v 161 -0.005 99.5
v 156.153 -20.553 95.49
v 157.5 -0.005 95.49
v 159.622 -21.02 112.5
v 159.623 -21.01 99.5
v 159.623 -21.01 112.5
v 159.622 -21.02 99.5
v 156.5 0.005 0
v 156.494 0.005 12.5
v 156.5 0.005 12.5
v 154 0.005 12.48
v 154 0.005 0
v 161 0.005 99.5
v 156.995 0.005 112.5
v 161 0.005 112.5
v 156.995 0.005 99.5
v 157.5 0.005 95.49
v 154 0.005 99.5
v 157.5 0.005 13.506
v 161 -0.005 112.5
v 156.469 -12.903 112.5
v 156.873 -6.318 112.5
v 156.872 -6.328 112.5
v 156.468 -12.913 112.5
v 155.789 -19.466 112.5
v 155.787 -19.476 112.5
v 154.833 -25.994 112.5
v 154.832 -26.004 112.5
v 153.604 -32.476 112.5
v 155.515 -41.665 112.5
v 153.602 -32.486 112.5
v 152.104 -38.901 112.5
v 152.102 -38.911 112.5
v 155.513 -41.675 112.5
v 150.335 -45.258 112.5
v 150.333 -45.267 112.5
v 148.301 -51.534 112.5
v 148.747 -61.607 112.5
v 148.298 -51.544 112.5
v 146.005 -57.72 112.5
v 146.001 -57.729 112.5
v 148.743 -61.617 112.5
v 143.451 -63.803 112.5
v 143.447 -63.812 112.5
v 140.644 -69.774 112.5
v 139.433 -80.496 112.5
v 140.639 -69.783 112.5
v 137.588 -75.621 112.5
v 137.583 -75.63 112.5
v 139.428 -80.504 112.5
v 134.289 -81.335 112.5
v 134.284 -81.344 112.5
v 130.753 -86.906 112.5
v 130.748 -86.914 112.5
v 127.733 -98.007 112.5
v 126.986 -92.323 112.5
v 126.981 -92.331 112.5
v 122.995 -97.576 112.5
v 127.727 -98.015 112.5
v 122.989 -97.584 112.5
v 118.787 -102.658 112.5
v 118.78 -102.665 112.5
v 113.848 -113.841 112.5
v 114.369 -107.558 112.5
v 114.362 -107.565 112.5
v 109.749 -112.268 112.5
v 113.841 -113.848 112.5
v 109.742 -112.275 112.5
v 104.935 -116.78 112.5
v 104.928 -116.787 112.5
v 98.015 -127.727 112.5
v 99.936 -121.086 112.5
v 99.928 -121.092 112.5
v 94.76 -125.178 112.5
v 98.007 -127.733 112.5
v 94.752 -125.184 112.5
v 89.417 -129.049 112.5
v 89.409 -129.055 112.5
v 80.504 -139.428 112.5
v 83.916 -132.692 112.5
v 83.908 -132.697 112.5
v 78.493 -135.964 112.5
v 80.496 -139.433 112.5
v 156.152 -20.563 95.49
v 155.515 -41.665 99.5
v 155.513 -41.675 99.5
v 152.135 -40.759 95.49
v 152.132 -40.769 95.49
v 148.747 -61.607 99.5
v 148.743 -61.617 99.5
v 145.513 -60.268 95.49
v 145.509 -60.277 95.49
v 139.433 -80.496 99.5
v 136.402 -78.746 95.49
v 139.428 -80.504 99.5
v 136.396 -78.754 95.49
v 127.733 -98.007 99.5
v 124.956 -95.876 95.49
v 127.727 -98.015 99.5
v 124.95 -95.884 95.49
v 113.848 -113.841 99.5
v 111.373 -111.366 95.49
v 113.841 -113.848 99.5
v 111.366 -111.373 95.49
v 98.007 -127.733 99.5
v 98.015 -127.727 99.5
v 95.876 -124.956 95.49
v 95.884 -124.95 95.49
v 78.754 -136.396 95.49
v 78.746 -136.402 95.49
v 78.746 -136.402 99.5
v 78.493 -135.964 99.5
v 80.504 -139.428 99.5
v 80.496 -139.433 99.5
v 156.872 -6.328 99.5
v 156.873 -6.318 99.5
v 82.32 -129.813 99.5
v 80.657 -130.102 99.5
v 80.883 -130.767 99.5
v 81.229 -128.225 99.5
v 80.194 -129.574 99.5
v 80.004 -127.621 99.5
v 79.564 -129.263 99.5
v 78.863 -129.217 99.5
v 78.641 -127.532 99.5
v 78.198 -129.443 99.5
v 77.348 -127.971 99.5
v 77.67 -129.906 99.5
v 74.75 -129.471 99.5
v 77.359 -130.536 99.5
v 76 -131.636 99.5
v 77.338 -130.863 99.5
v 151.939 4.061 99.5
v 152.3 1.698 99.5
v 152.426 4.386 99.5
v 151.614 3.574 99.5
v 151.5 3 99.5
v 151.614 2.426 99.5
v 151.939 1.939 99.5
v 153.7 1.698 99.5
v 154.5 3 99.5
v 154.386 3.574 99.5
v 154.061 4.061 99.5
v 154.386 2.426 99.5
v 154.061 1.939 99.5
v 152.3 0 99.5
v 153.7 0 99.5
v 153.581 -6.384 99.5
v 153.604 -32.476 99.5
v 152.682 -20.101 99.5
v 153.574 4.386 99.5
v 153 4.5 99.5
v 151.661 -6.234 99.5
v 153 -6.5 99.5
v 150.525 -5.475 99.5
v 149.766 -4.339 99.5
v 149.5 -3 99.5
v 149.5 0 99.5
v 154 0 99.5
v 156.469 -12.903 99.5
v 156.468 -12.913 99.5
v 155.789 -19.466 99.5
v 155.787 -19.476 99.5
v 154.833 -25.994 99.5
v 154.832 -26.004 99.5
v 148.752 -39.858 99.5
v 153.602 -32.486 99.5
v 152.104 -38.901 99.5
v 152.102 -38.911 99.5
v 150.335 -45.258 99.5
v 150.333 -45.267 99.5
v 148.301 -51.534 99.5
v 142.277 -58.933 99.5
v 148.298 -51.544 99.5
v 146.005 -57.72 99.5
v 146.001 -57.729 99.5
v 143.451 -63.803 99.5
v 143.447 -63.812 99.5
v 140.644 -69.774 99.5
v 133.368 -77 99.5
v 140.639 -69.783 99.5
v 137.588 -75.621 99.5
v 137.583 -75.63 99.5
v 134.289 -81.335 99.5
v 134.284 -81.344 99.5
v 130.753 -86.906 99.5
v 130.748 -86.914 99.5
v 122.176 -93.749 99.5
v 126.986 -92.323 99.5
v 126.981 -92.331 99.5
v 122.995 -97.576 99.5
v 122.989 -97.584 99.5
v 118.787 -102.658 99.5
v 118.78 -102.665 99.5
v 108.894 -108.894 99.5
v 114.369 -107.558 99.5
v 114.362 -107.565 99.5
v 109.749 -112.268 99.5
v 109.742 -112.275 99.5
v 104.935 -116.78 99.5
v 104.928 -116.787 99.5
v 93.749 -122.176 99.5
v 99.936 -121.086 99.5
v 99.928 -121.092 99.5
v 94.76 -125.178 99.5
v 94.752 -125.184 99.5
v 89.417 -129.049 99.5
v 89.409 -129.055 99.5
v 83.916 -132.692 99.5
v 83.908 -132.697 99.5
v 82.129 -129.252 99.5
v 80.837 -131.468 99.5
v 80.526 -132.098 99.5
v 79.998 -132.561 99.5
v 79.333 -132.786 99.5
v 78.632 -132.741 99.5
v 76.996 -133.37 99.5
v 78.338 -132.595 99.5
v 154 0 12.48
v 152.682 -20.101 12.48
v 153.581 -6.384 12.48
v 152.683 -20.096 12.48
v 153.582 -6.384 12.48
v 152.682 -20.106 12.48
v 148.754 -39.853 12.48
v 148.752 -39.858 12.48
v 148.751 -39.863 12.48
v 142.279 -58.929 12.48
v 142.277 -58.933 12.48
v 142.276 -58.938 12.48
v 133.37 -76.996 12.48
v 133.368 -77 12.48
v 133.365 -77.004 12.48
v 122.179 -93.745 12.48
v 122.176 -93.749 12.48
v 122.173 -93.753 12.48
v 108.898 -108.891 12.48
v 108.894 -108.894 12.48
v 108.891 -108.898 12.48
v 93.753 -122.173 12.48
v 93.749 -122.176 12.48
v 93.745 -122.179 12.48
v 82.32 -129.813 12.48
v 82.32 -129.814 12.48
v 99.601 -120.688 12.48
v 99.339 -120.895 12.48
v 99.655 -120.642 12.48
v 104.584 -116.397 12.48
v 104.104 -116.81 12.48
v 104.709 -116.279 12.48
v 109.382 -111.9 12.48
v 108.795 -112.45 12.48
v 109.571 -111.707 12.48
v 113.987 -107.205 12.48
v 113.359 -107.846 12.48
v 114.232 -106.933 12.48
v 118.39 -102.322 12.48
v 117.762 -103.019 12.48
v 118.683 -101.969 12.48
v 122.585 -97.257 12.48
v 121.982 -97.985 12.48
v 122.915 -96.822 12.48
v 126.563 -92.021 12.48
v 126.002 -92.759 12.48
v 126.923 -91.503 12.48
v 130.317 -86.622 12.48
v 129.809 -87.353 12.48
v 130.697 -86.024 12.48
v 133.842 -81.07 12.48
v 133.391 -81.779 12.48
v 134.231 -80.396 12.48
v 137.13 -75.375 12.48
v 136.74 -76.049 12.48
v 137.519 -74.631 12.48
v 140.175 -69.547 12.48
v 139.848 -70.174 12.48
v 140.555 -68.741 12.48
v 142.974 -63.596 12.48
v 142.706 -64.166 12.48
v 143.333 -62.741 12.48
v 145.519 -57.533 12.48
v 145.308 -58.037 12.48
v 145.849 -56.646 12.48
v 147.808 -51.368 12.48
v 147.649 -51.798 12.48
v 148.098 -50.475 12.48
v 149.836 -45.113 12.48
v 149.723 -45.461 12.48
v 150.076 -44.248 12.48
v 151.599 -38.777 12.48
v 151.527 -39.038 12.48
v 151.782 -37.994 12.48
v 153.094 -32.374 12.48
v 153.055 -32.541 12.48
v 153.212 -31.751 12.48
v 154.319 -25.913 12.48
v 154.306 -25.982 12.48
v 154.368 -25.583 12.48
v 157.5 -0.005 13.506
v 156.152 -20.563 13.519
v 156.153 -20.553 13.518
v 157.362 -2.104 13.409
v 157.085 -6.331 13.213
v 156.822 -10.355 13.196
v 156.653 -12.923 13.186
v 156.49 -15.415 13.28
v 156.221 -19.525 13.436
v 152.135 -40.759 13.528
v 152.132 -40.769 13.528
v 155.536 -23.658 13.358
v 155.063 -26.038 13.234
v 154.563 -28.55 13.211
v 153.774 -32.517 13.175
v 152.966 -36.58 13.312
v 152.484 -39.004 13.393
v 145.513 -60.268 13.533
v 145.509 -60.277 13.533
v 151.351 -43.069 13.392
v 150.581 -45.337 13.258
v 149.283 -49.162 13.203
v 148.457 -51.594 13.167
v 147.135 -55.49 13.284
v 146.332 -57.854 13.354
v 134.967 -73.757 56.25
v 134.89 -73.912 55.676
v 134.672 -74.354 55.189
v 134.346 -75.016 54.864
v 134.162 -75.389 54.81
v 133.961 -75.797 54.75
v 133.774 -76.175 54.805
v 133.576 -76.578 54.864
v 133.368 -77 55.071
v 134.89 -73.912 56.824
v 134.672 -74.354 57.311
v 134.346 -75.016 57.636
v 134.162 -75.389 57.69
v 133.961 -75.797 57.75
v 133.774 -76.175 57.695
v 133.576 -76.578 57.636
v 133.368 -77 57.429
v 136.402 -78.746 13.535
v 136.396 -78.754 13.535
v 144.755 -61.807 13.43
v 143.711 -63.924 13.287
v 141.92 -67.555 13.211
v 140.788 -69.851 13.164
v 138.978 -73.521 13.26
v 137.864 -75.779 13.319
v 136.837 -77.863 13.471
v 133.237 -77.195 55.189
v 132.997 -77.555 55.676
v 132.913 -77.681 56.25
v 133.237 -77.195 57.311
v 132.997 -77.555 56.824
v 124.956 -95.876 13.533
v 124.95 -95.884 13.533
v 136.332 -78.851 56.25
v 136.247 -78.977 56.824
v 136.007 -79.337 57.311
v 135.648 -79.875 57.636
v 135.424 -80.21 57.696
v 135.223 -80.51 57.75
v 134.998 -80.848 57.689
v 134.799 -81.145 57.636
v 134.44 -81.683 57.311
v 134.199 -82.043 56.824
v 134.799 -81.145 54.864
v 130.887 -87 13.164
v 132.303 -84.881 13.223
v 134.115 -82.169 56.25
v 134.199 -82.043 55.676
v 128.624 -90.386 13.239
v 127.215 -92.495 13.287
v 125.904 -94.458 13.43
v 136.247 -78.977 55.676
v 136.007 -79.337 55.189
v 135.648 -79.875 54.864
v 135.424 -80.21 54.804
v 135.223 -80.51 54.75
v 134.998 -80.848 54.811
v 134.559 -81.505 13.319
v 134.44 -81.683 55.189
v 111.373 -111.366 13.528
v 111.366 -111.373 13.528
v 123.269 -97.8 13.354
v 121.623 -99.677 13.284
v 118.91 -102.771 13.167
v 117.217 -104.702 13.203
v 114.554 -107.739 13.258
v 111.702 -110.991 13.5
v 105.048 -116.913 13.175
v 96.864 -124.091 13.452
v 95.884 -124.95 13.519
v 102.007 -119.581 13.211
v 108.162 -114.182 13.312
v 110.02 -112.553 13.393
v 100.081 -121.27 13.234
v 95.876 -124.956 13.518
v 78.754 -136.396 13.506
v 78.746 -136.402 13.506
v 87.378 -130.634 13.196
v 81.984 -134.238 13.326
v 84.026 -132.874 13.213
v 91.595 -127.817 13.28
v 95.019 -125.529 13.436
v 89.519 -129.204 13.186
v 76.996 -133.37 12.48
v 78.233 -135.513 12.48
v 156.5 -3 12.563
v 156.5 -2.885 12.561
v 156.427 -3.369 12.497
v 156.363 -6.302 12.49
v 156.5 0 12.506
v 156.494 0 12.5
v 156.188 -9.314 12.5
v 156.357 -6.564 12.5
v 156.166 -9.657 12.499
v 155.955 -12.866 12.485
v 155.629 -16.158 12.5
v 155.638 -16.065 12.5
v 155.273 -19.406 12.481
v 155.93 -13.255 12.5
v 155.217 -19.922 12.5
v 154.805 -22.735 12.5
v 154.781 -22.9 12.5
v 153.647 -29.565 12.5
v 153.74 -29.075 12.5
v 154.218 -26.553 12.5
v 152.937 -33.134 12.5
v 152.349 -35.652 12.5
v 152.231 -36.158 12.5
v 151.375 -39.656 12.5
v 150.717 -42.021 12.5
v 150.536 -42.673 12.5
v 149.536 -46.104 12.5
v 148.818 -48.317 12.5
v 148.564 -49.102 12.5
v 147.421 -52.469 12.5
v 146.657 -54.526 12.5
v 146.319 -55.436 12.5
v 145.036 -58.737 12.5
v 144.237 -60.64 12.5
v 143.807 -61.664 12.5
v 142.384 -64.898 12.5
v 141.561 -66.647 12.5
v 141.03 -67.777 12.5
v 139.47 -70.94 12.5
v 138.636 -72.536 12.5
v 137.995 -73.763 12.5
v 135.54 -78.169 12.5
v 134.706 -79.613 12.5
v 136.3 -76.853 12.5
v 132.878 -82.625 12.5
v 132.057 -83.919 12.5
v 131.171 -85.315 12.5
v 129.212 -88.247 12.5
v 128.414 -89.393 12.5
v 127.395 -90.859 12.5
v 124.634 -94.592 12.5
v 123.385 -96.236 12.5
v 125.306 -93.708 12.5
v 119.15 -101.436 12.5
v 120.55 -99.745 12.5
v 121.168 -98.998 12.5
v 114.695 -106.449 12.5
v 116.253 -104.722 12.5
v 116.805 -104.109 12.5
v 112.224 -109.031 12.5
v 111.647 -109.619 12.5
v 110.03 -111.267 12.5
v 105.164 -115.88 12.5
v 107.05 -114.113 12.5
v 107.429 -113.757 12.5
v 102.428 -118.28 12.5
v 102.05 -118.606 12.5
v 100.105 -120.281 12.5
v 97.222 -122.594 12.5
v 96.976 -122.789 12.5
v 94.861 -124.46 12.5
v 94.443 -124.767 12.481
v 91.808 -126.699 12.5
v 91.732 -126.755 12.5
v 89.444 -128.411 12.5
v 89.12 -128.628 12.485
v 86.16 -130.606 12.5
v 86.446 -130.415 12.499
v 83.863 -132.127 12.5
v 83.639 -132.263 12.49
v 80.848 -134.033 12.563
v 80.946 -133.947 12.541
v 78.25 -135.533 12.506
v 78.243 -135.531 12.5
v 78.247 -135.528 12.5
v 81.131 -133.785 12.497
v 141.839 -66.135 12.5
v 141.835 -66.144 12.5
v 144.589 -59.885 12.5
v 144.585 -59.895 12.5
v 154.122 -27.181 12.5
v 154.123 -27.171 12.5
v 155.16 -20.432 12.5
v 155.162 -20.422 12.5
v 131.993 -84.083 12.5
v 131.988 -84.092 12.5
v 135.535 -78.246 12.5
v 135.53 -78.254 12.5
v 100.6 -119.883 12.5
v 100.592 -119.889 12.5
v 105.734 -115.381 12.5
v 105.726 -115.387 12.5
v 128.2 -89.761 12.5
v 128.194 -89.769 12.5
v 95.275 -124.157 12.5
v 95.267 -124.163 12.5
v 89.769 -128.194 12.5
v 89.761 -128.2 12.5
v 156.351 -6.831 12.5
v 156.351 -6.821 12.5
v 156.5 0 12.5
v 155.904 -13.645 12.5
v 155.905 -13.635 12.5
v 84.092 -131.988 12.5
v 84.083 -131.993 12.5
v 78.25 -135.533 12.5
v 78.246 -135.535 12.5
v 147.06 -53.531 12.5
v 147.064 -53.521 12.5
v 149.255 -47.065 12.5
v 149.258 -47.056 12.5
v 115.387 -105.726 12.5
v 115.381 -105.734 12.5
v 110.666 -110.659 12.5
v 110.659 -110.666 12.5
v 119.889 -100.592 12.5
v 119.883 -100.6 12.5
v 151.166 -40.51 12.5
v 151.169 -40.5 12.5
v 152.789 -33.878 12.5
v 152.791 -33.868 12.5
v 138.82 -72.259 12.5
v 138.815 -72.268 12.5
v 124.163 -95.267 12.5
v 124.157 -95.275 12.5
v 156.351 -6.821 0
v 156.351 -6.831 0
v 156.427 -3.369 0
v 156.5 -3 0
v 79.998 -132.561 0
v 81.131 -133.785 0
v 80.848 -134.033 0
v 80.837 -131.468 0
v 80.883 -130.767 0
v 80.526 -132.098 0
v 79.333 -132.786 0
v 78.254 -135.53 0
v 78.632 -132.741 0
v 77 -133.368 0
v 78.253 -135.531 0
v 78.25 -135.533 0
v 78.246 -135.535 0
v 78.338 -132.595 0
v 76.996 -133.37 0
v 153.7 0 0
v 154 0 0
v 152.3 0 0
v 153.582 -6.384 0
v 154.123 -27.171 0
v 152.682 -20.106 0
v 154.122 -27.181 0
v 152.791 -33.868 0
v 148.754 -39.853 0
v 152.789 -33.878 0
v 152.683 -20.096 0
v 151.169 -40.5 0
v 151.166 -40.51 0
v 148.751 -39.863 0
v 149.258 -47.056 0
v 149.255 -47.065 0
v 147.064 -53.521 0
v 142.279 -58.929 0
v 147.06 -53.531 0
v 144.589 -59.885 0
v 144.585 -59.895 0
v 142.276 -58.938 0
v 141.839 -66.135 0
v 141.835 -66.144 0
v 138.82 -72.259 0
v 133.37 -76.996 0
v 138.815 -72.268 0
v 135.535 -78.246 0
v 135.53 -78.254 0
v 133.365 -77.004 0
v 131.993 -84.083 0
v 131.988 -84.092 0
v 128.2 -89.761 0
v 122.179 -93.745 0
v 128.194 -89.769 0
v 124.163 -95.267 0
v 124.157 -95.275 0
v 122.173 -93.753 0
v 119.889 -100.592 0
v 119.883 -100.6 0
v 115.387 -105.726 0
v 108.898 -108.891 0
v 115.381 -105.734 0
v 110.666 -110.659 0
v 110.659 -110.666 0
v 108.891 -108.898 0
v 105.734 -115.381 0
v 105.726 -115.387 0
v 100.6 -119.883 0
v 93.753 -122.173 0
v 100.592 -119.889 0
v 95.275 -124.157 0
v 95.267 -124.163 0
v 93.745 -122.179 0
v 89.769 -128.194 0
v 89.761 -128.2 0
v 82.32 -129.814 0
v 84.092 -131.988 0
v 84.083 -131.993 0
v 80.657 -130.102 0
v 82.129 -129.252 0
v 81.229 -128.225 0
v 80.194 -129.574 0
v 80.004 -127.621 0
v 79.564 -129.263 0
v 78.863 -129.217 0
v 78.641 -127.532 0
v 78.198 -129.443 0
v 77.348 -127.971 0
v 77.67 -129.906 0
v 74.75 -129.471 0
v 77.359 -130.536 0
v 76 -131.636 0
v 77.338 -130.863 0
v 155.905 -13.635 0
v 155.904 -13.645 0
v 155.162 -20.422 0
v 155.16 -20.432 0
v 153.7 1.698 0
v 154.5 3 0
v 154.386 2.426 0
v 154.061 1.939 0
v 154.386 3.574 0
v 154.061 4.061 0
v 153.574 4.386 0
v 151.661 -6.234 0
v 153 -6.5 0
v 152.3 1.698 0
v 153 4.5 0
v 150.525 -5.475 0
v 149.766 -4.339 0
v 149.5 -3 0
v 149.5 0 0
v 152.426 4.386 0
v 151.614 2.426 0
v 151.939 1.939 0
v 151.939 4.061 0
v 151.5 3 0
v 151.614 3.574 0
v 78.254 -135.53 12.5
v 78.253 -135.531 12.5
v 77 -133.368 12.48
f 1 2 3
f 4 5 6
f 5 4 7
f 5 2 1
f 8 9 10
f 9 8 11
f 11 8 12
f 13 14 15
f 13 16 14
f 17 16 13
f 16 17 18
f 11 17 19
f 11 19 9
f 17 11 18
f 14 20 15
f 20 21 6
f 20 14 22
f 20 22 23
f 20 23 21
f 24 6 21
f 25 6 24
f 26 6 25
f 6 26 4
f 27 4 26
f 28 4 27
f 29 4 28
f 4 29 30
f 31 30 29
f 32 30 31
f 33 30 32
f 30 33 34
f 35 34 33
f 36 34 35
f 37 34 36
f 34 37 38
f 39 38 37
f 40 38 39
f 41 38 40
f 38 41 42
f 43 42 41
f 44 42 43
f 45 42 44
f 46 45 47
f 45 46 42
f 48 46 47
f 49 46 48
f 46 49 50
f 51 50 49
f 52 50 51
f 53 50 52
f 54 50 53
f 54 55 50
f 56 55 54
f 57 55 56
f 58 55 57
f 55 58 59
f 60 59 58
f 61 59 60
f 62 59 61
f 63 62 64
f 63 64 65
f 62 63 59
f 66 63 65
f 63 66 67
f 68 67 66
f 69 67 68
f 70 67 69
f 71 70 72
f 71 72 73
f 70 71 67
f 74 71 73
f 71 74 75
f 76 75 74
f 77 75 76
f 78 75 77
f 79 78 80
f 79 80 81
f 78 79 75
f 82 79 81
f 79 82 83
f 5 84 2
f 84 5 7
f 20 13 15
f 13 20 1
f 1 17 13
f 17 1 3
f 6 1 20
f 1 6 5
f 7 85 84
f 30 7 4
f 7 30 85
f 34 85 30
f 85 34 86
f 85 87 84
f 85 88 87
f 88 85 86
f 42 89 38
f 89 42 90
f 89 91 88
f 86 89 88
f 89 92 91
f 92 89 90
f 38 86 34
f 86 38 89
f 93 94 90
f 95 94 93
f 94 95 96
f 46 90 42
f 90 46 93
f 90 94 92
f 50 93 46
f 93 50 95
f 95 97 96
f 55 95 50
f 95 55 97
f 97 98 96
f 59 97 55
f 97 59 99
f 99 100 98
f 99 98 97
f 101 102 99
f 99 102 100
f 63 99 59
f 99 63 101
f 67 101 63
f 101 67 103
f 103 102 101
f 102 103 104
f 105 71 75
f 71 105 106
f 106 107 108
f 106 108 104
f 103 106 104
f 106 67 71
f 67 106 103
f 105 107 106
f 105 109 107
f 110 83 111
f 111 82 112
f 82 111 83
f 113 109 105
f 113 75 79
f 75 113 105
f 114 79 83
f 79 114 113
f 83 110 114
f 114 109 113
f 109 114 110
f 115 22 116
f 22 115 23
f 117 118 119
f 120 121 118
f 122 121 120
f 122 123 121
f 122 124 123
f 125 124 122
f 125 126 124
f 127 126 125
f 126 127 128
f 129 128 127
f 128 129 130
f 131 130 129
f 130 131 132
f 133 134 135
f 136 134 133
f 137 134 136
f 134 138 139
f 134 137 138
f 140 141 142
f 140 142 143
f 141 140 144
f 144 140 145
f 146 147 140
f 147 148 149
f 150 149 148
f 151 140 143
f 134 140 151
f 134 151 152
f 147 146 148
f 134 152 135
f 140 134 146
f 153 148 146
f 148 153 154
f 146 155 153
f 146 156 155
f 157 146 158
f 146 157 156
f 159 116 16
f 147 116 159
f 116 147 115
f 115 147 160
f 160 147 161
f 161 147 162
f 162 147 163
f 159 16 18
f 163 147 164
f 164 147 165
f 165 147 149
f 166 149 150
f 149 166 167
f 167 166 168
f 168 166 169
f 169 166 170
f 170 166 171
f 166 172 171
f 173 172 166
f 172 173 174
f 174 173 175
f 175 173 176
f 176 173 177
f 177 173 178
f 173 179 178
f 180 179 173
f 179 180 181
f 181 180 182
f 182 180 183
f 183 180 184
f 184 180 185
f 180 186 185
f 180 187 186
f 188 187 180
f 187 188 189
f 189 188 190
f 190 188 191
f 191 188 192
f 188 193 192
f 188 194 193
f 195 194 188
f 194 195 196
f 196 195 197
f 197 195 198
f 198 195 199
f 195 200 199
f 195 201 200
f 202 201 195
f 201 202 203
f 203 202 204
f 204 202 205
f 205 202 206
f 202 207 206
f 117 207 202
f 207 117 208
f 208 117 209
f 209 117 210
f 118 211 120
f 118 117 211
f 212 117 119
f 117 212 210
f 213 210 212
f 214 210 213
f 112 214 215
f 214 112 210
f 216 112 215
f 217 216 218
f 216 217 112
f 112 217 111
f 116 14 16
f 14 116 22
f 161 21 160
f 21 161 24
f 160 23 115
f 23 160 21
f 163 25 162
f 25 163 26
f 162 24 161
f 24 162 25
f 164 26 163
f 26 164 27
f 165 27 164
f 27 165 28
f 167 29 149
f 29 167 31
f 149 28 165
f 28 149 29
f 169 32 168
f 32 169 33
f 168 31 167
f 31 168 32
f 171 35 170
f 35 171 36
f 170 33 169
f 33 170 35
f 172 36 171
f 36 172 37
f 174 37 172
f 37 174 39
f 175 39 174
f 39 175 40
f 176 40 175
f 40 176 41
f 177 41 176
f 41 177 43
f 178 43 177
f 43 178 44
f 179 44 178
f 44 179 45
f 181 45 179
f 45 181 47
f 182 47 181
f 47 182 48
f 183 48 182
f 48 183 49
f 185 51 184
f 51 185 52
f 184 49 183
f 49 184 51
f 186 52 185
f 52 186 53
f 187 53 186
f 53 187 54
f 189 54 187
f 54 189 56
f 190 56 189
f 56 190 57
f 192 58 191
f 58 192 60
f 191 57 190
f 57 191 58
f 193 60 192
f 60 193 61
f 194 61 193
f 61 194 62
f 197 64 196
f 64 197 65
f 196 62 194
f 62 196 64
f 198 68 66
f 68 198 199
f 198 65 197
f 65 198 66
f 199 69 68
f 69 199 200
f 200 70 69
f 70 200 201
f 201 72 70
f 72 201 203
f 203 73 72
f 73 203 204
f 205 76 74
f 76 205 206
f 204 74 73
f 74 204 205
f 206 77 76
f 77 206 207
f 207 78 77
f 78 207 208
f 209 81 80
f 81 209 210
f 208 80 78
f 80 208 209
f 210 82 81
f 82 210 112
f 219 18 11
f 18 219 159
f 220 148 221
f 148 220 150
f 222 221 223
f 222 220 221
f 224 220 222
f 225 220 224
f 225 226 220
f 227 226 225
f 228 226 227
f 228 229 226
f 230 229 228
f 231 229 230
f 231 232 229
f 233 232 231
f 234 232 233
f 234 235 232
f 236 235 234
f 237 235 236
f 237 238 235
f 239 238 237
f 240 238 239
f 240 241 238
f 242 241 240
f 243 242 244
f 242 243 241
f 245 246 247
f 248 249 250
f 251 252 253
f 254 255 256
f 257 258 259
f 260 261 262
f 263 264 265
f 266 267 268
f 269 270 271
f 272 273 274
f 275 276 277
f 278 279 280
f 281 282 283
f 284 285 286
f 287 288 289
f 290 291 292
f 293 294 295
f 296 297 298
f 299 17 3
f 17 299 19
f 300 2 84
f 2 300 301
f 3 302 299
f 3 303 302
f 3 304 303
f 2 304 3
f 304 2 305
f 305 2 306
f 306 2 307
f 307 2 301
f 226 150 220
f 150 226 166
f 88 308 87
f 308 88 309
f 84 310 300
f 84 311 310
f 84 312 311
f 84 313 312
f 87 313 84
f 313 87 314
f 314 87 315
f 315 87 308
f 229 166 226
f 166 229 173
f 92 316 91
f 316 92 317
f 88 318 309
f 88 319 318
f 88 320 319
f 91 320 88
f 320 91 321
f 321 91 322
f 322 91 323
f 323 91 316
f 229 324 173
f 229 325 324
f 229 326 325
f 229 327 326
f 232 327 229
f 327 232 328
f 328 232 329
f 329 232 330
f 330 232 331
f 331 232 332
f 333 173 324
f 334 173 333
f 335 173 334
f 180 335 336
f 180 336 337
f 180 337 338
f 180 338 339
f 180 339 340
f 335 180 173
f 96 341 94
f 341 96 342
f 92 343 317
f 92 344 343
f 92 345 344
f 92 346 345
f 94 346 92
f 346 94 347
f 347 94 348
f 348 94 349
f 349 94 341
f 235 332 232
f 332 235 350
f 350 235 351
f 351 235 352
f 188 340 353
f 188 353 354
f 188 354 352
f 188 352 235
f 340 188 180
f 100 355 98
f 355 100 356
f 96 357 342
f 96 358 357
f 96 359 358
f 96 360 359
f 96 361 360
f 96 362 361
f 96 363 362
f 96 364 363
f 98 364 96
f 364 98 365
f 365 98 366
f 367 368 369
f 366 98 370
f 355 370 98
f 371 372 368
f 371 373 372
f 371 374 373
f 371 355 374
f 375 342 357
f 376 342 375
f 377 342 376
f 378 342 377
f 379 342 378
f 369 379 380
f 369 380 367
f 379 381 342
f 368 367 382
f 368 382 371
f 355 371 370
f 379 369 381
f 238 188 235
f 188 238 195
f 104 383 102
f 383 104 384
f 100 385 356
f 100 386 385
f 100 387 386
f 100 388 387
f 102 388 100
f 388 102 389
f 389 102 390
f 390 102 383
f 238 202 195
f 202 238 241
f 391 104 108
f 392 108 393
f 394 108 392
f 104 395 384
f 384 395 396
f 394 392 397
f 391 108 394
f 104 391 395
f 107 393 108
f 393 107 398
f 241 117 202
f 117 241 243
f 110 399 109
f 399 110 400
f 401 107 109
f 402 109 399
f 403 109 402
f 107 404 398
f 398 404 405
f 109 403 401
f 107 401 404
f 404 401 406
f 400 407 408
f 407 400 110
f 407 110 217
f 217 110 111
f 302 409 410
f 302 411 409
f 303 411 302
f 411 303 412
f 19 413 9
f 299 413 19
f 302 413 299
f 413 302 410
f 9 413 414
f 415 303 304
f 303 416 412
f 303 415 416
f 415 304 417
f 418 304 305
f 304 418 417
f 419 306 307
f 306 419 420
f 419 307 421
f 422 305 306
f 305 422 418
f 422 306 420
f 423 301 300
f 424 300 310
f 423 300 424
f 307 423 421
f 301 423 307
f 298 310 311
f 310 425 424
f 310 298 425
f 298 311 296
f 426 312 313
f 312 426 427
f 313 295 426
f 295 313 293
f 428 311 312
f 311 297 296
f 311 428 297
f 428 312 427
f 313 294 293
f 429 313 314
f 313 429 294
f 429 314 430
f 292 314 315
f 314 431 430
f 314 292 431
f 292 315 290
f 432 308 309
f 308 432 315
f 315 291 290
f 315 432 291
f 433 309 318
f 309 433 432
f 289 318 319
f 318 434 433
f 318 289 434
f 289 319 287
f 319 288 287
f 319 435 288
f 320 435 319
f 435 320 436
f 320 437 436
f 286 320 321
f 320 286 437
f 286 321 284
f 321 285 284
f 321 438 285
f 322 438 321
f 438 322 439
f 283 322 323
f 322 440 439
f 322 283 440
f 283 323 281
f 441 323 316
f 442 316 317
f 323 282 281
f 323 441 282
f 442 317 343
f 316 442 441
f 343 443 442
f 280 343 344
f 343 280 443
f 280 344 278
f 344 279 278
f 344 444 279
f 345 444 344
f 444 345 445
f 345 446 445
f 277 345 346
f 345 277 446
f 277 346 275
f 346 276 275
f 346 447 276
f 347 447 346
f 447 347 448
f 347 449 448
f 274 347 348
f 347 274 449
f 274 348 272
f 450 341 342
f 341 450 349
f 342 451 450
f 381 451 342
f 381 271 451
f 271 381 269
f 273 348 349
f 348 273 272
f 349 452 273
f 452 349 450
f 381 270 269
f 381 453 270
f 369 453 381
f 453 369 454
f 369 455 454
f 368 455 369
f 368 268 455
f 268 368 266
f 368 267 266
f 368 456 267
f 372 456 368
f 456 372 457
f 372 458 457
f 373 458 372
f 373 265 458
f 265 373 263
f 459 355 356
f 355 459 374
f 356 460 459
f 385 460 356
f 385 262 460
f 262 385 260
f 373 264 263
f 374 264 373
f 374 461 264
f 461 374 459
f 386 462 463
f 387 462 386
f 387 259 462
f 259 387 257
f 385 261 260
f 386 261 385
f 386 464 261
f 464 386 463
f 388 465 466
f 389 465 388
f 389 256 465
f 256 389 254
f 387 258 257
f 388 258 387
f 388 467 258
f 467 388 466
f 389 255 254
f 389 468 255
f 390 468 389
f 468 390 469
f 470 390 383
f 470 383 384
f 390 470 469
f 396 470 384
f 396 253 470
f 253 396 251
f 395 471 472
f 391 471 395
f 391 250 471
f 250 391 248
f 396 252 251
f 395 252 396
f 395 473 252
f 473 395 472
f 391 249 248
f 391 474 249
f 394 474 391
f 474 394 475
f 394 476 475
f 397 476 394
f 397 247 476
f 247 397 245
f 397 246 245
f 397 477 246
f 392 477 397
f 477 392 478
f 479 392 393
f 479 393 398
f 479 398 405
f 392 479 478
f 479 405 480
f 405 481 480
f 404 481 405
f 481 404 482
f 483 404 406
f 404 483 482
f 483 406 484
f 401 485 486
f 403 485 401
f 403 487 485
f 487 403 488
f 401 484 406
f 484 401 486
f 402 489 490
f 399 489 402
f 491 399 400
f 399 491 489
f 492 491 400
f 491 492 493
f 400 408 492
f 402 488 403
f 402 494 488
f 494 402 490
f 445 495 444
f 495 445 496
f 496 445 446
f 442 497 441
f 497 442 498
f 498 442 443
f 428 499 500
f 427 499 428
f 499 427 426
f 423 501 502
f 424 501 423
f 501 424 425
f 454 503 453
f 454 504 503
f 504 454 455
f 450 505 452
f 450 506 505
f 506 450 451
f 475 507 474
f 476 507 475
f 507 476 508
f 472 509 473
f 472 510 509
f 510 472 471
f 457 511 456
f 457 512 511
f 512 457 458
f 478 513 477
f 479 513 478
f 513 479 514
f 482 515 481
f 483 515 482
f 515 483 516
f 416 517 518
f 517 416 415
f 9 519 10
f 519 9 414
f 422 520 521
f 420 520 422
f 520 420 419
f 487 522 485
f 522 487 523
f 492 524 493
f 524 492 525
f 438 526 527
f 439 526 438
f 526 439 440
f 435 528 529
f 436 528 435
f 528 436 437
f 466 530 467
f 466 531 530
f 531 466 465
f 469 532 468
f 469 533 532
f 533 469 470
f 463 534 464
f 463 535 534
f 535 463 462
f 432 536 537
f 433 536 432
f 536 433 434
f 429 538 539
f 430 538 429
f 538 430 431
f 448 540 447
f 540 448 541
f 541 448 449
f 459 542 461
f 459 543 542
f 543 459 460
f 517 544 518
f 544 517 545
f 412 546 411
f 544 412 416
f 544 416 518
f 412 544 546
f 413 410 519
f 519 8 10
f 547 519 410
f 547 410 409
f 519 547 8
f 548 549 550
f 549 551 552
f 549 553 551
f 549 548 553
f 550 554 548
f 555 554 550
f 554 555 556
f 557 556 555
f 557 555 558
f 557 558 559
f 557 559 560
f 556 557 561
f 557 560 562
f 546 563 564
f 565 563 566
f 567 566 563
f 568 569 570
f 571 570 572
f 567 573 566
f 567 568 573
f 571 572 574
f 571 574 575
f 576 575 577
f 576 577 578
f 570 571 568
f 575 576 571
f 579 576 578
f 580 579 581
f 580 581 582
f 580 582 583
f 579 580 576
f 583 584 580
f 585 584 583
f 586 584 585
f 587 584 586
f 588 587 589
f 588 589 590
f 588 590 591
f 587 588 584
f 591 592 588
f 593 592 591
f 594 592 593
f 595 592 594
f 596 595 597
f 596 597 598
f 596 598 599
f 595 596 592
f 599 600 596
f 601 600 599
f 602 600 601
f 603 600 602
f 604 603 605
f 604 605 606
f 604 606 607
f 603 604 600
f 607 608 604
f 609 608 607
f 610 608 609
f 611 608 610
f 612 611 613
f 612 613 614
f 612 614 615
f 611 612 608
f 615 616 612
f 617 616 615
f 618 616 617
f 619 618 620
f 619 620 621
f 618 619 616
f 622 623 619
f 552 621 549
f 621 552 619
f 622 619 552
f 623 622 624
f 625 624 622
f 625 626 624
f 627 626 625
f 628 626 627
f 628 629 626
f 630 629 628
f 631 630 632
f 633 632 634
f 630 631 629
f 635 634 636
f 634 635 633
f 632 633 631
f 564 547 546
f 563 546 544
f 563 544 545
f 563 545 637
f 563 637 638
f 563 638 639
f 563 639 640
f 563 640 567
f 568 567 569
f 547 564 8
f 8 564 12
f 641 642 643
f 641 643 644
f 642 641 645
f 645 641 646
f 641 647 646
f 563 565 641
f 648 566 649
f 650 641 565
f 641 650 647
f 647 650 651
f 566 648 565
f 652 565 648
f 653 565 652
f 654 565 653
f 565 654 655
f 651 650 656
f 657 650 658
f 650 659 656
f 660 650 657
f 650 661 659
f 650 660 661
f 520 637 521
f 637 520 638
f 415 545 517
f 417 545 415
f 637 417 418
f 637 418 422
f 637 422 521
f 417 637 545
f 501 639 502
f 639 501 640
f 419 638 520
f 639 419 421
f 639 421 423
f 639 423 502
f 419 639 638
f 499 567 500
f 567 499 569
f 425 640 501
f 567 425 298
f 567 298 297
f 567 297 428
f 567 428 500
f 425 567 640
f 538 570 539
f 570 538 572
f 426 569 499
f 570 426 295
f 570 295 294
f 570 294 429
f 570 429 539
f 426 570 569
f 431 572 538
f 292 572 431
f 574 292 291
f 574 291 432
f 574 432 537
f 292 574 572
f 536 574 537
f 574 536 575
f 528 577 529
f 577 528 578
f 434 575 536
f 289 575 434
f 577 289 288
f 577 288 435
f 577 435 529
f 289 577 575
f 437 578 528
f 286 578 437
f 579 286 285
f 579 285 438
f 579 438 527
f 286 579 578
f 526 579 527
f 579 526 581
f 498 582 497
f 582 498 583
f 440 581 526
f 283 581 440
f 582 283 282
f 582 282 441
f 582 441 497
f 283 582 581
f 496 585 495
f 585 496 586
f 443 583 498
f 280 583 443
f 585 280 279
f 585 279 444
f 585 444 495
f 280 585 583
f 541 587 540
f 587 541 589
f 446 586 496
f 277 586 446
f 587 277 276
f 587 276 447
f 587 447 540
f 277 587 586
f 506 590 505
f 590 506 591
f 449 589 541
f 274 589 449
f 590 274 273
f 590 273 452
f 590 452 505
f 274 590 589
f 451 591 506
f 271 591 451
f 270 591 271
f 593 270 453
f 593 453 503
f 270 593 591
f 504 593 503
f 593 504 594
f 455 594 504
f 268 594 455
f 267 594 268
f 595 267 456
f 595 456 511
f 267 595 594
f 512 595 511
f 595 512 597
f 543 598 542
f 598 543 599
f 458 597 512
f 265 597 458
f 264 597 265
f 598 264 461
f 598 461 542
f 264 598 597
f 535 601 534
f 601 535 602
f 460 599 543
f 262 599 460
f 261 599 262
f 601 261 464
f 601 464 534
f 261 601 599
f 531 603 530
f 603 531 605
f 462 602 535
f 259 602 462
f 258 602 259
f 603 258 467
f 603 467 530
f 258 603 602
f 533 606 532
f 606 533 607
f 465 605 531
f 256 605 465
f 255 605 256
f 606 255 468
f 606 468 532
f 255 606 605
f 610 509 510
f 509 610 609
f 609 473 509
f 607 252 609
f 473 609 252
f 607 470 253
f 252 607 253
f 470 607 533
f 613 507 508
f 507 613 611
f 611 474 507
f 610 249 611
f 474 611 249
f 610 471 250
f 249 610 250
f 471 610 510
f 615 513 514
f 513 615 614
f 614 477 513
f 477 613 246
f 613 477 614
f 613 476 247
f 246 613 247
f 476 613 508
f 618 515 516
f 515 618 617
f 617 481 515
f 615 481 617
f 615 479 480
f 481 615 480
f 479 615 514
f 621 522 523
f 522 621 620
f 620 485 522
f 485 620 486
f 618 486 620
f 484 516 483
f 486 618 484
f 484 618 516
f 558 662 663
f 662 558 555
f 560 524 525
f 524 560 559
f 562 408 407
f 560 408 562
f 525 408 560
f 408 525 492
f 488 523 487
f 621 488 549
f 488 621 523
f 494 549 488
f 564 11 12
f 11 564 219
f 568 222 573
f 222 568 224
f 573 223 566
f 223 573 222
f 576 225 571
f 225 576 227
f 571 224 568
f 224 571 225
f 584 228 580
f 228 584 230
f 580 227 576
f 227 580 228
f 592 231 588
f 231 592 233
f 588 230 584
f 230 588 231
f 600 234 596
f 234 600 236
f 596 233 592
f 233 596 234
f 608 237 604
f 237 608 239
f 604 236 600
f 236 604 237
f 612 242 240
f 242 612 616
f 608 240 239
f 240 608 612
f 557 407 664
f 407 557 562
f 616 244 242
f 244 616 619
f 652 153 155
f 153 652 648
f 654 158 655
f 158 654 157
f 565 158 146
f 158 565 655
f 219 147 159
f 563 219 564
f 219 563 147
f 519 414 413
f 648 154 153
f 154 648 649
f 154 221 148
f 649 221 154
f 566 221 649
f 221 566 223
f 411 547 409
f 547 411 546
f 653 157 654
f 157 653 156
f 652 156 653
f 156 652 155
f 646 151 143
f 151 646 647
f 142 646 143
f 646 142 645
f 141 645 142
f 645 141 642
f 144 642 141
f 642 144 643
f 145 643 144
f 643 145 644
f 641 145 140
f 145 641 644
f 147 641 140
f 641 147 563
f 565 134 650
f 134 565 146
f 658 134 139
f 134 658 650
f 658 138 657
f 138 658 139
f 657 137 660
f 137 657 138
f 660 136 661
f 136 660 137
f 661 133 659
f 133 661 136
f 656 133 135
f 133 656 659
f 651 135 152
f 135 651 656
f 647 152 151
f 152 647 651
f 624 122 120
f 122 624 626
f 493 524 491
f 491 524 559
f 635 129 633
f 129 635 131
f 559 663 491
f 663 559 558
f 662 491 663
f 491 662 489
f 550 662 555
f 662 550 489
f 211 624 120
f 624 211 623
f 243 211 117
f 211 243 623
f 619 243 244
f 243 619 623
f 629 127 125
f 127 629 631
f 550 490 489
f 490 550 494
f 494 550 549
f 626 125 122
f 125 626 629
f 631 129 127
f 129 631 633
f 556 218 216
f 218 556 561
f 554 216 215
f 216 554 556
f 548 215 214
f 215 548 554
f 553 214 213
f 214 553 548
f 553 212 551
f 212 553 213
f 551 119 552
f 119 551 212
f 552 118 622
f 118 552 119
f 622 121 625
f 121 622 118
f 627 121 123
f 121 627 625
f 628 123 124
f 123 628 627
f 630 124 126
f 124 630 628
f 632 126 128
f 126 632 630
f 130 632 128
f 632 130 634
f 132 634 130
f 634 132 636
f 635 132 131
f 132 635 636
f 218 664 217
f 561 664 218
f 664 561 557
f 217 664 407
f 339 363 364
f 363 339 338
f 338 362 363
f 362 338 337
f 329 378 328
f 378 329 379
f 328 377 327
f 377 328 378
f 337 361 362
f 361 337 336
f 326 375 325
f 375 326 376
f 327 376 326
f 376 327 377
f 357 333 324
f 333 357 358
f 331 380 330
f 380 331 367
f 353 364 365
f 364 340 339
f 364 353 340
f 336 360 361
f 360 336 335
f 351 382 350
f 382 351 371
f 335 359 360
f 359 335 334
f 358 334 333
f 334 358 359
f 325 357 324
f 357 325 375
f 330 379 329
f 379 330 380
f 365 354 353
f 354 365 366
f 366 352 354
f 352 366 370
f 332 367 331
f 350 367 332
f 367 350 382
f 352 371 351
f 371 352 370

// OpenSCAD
// This is a spacer for converting a food dehydrator into a filement dryer.
// Many of the available food dehydrators have the same shell diameter, 12 9/16" OD
// Mine is a Salton VitaPro, and I believe the Self-Mate is the same.
// I based this very heavily on: https://www.thingiverse.com/thing:3027142
// I had some issues with printing the inside curve, so I parameterised it to allow specifying
// curve resolutions for mating surfaces vs. non-mating surfaces
// I used my rotate-extrude-helix module heavily in this, it can be found at:
// https://www.thingiverse.com/thing:3252949
// Creative Commons - Attribution - Share Alike License
// http://creativecommons.org/licenses/by-sa/3.0/

// Thickness of the edge that inserts into the next layer
edge_thickness = 2.5;
// Height of the edge that inserts into the next layer
edge_height = 12.5;
// Thickness of the shell spacer section wall
shell_thickness = 3.5;
// Clearance between the mating surfaces between layers
shell_clearance = 0.5;
// Number of sides to the full circle for the non-mating surfaces
coarse_circularity = 48;
// Number of sides to the full circle for the mating surfaces, fine_circularity should be a multiple of coarse_circularity
fine_circularity = 144;
// Diameter of the centreline of the insert edge (12 9/16" OD)
sector_diameter = 310.5;
// Number of degrees in one section. If you had a big enough print surface, 360 would work
sector_angle = 60;
// Height between layers
sector_height = 100;
// Clearance between the mating surfaces of the tongue and groove joint between sections
joint_clearance = 0.3;
// Maximum thickness of the tongue and groove joint between sections
joint_outer_thickness = 7.0;
// Diameter of the 'tongue' section of the tongue and groove joint between sections
joint_inner_diameter = 3.0;
// Minimum thickness of the 'tongue' section of the tongue and groove joint between sections
joint_min_thickness = 1.4;
// Offset of the 'tongue' section of the tongue and groove joint between sections
joint_offset = 3.0;
// Diameter of the filament feed hole in mm. If zero, don't include it
feed_hole_diameter = 3;
// Angle of the filament feed hole in degrees
feed_hole_angle = 45;

/* [Hidden] */

sector(sectorAngle = sector_angle, sectorHeight = sector_height, sectorDiameter = sector_diameter, edgeThickness = edge_thickness, edgeHeight = edge_height, shellThickness = shell_thickness, shellClearance = shell_clearance, fineCircularity = fine_circularity, coarseCircularity = coarse_circularity, jointOffset = joint_offset, jointOuterThickness = joint_outer_thickness, jointMinThickness = joint_min_thickness, jointInnerDiameter = joint_inner_diameter, jointClearance = joint_clearance, feedHoleDiameter = feed_hole_diameter, feedHoleAngle = feed_hole_angle);

// The following modules are normally included, but the thingiverse customizer doesn't like that
//use <../helix/rotate-extrude-helix.scad>;

module segment(radius, segmentIndex, deltaAngle, deltaOffset, deltaScaleShape, deltaScaleRadius, deltaTwistAngle, subtract = false) {
  angle1 = segmentIndex * deltaAngle - (subtract ? 0.01 : 0);
  offset1 = segmentIndex * deltaOffset;
  scaledRadius1 = (1.0 + segmentIndex * deltaScaleRadius) * radius;
  scaledScale1 = 1.0 + segmentIndex * deltaScaleShape;
  scaledTwist1 = segmentIndex * deltaTwistAngle;
  angle2 = (segmentIndex + 1) * deltaAngle + (subtract ? 0.01 : 0);
  offset2 = (segmentIndex + 1) * deltaOffset;
  scaledRadius2 = (1.0 + (segmentIndex + 1) * deltaScaleRadius) * radius;
  scaledScale2 = 1.0 + (segmentIndex + 1) * deltaScaleShape;
  scaledTwist2 = (segmentIndex + 1) * deltaTwistAngle;
  hull() {
    translate([0, 0, offset1]) {
      rotate([0, 0, angle1]) {
        rotate([90, 0, 0]) {
          linear_extrude(height = .01, center = true) {
            translate([scaledRadius1, 0, 0]) {
              scale([scaledScale1, scaledScale1, 1]) {
                rotate([0, 0, scaledTwist1]) {
                  children();
                }
              }
            }
          }
        }
      }
    }
    translate([0, 0, offset2]) {
      rotate([0, 0, angle2]) {
        rotate([90, 0, 0]) {
          linear_extrude(height = .01, center = true) {
            translate([scaledRadius2, 0, 0]) {
              scale([scaledScale2, scaledScale2, 1]) {
                rotate([0, 0, scaledTwist2]) {
                  children();
                }
              }
            }
          }
        }
      }
    }
  }
}

module rotate_extrude_helix(angle = 360, radius = 0, offset = 0, scaleShape = 1.0, scaleRadius = 1.0, twistAngle = 0, center = false, joinType = "union") {
  n = max(2, ceil($fn * abs(angle) / 360));
 
  deltaAngle = angle / n;
  deltaTwistAngle = twistAngle / n;
  deltaOffset = offset / n;
  deltaScaleRadius = (scaleRadius - 1.0) / n;
  deltaScaleShape = (scaleShape - 1.0) / n;

  translate([0, 0, center ? -offset / 2 : 0]) {
    union() {
      if ($children > 0) {
        for (i = [0 : n - 1]) {
          if (joinType == "difference") {
            difference() {
              segment(radius, segmentIndex = i, deltaAngle = deltaAngle, deltaOffset = deltaOffset, deltaScaleShape = deltaScaleShape, deltaScaleRadius = deltaScaleRadius, deltaTwistAngle = deltaTwistAngle) {
                children(0);
              }
              if ($children > 1) {
                for (childIndex = [1 : $children - 1]) {
                  segment(radius, segmentIndex = i, deltaAngle = deltaAngle, deltaOffset = deltaOffset, deltaScaleShape = deltaScaleShape, deltaScaleRadius = deltaScaleRadius, deltaTwistAngle = deltaTwistAngle, subtract = true) {
                    children(childIndex);
                  }
                }
              }
            }
          } else if (joinType == "intersection") {
            intersection_for(childIndex = [0 : $children - 1]) {
              segment(radius, segmentIndex = i, deltaAngle = deltaAngle, deltaOffset = deltaOffset, deltaScaleShape = deltaScaleShape, deltaScaleRadius = deltaScaleRadius, deltaTwistAngle = deltaTwistAngle) {
                children(childIndex);
              }
            }
          } else {
            union() {
              for (childIndex = [0 : $children - 1]) {
                segment(radius, segmentIndex = i, deltaAngle = deltaAngle, deltaOffset = deltaOffset, deltaScaleShape = deltaScaleShape, deltaScaleRadius = deltaScaleRadius, deltaTwistAngle = deltaTwistAngle) {
                  children(childIndex);
                }
              }
            }
          }
        }
      }
    }
  }
}

function outerRadius(innerRadius, sides) = innerRadius / cos(180 / sides);

function shellRadius(sectorRadius, edgeThickness, shellThickness, coarseCircularity) = sectorRadius - edgeThickness / 2 + shellThickness / 2;

function outerShellRadius(shellRadius, shellThickness, shellClearance, edgeThickness) = shellRadius + (edgeThickness + shellThickness) / 2 + shellClearance;
function outerShoulderHeight(edgeHeight, shellClearance) = edgeHeight + shellClearance;
function innerShoulderHeight(edgeHeight, shellThickness, shellClearance) = outerShoulderHeight(edgeHeight, shellClearance) + shellThickness + shellClearance;

module sector(sectorAngle, sectorHeight, sectorDiameter, edgeThickness, edgeHeight, shellThickness, shellClearance, fineCircularity, coarseCircularity, jointOffset, jointOuterThickness, jointMinThickness, jointInnerDiameter, jointClearance, feedHoleDiameter, feedHoleAngle) {
  sectorRadius = sectorDiameter / 2;
  shellRadius = shellRadius(sectorRadius, edgeThickness, shellThickness, coarseCircularity);
  outerShellRadius = outerShellRadius(shellRadius, shellThickness, shellClearance, edgeThickness);
  outerShoulderHeight = outerShoulderHeight(edgeHeight, shellClearance);
  innerShoulderHeight = innerShoulderHeight(edgeHeight, shellThickness, shellClearance);
  shellHeight = sectorHeight - outerShoulderHeight;
  effectiveSectorAngle = sectorAngle >= 360 ? 360.1 : sectorAngle;

  translate([0, 0, sectorHeight + edgeHeight]) {
    scale([1, -1, -1]) {
      difference() {
        union() {
          outerEdge(effectiveSectorAngle, sectorRadius = sectorRadius, edgeThickness = edgeThickness, edgeHeight = edgeHeight, shellRadius = shellRadius, shellThickness = shellThickness, shellClearance = shellClearance, fineCircularity = fineCircularity, coarseCircularity = coarseCircularity);
          translate([0, 0, outerShoulderHeight]) {
            shell(effectiveSectorAngle, sectorRadius = sectorRadius, shellThickness = shellThickness, shellHeight = shellHeight, edgeThickness = edgeThickness, fineCircularity = fineCircularity, coarseCircularity = coarseCircularity);
          }
          translate([0, 0, sector_height]) {
            innerEdge(effectiveSectorAngle, sectorRadius = sectorRadius, edgeThickness = edgeThickness, edgeHeight = edgeHeight, fineCircularity = fineCircularity, coarseCircularity = coarseCircularity);
          }

          if (sectorAngle < 360) {
            rotate([0, 0, 0]) {
              translate([sectorRadius + (edgeThickness - jointOuterThickness) / 2, 0, outerShoulderHeight]) {
                jointBase(height = sectorHeight - shellClearance, offset = jointOffset, outerThickness = jointOuterThickness, minThickness = jointMinThickness, innerDiameter = jointInnerDiameter, clearance = jointClearance);
                jointMale(height = sectorHeight - shellClearance, offset = jointOffset, outerThickness = jointOuterThickness, minThickness = jointMinThickness, innerDiameter = jointInnerDiameter, clearance = jointClearance);
              }
            }
            rotate([0, 0, sectorAngle]) {
              scale([1, -1, 1]) {
                translate([sectorRadius + (edgeThickness - jointOuterThickness) / 2, 0, outerShoulderHeight]) {
                  jointBase(height = sectorHeight - shellClearance, offset = jointOffset, outerThickness = jointOuterThickness, minThickness = jointMinThickness, innerDiameter = jointInnerDiameter, clearance = jointClearance);
                }
              }
            }
          }
        }
        if (sectorAngle < 360) {
          rotate([0, 0, sectorAngle]) {
            scale([1, -1, 1]) {
              translate([sectorRadius + (edgeThickness - jointOuterThickness) / 2, 0, outerShoulderHeight]) {
                jointFemale(height = sectorHeight - shellClearance, offset = jointOffset, outerThickness = jointOuterThickness, minThickness = jointMinThickness, innerDiameter = jointInnerDiameter, clearance = jointClearance);
              }
            }
          }
        }
        if (feedHoleDiameter > 0) {
          rotate([0, 0, sectorAngle / 2]) {
            translate([sectorRadius, 0, (edgeHeight + sectorHeight) / 2]) {
              rotate([0, 90, 90 - feedHoleAngle]) {
                cylinder(r = feedHoleDiameter / 2, h = 100, center = true, $fn = 16);
              }
            }
          }
        }
      }
    }
  }
}

module outerEdge(sectorAngle, sectorRadius, edgeThickness, edgeHeight, shellRadius, shellThickness, shellClearance, fineCircularity, coarseCircularity) {
  outerShellRadius = outerShellRadius(shellRadius, shellThickness, shellClearance, edgeThickness);
  outerShoulderHeight = outerShoulderHeight(edgeHeight, shellClearance);
  innerShoulderHeight = innerShoulderHeight(edgeHeight, shellThickness, shellClearance);

  difference() {
    rotate_extrude_helix(angle = sectorAngle, center = false, $fn = coarseCircularity) {
      polygon(points = [
        [0.1, 0],
        [outerShellRadius + shellThickness / 2, 0],
        [outerShellRadius + shellThickness / 2, outerShoulderHeight],
        [shellRadius + shellThickness / 2, innerShoulderHeight + 0.01],
        [0.1, innerShoulderHeight + 0.01]
      ]);
    }
    rotate([0, 0, -0.1]) {
      rotate_extrude_helix(angle = sectorAngle + 0.2, center = false, $fn = fineCircularity) {
        translate([0, -0.01, 0]) {
          square(size = [sectorRadius + shellClearance + edgeThickness / 2, outerShoulderHeight + 0.01], center = false);
        }
        translate([0, -0.01, 0]) {
          square(size = [sectorRadius - edgeThickness / 3, innerShoulderHeight + 0.03], center = false);
        }
      }
    }
  }
}

module shell(sectorAngle, sectorRadius, shellThickness, shellHeight, edgeThickness, fineCircularity, coarseCircularity) {
  shellRadius = shellRadius(sectorRadius, edgeThickness, shellThickness, coarseCircularity);
  difference() {
    rotate_extrude_helix(angle = sectorAngle, center = false, $fn = coarseCircularity, joinType = "difference") {
      translate([shellRadius, shellHeight / 2 + 0.01, 0]) {
        square(size = [shellThickness, shellHeight + 0.02], center = true);
      }
    }
    rotate([0, 0, -0.1]) {
      union() {
        rotate_extrude_helix(angle = sectorAngle + 0.2, center = false, $fn = fineCircularity) {
          polygon(points = [
            [sectorRadius + edgeThickness / 2 - shellThickness, shellHeight + shellThickness],
            [sectorRadius + edgeThickness / 2 + shellThickness, shellHeight + shellThickness],
            [sectorRadius + edgeThickness / 2 + shellThickness, shellHeight - shellThickness]
          ]);
        }
      }
    }
  }
}

module innerEdge(sectorAngle, sectorRadius, edgeThickness, edgeHeight, fineCircularity, coarseCircularity) {
  difference() {
    rotate_extrude_helix(angle = sectorAngle, radius = sectorRadius, center = false, $fn = fineCircularity) {
      translate([-edgeThickness / 2, edgeHeight / 2, 0]) {
        square(size = [2 * edgeThickness, edgeHeight], center = true);
      }
    }
    rotate_extrude_helix(angle = sectorAngle, radius = sectorRadius, center = false, $fn = coarseCircularity) {
      translate([-3 * edgeThickness / 2, edgeHeight / 2, 0]) {
        square(size = [2 * edgeThickness, edgeHeight + 0.02], center = true);
      }
    }
  }
}

module jointBase(height, offset, outerThickness, minThickness, innerDiameter, clearance) {
  linear_extrude(height = height, center = false) {
    union() {
      translate([0, offset / 2]) {
        square(size = [outerThickness, offset], center = true);
      }
      translate([0, offset]) {
        difference() {
          circle(r = outerThickness / 2, center = true, $fn = 16);
          translate([0, -3 * offset / 2]) {
            square(size = [outerThickness, offset], center = true);
      }
        }
      }
    }
  }
}

module jointMale(height, offset, outerThickness, minThickness, innerDiameter, clearance) {
  linear_extrude(height = height, center = false) {
    union() {
      translate([0, -offset / 2]) {
        square(size = [minThickness, offset + 0.02], center = true);
      }
      translate([0, -offset]) {
        circle(r = innerDiameter / 2, center = true, $fn = 16);
      }
    }
  }
}

module jointFemale(height, offset, outerThickness, minThickness, innerDiameter, clearance) {
  translate([0, 0, -0.01]) {
    linear_extrude(height = height + 0.02, center = false) {
      union() {
        translate([0, offset / 2]) {
          square(size = [minThickness + 2 * clearance, offset + 0.02], center = true);
        }
        translate([0, offset]) {
          circle(r = innerDiameter / 2 + clearance, center = true, $fn = 16);
        }
      }
    }
  }
}
